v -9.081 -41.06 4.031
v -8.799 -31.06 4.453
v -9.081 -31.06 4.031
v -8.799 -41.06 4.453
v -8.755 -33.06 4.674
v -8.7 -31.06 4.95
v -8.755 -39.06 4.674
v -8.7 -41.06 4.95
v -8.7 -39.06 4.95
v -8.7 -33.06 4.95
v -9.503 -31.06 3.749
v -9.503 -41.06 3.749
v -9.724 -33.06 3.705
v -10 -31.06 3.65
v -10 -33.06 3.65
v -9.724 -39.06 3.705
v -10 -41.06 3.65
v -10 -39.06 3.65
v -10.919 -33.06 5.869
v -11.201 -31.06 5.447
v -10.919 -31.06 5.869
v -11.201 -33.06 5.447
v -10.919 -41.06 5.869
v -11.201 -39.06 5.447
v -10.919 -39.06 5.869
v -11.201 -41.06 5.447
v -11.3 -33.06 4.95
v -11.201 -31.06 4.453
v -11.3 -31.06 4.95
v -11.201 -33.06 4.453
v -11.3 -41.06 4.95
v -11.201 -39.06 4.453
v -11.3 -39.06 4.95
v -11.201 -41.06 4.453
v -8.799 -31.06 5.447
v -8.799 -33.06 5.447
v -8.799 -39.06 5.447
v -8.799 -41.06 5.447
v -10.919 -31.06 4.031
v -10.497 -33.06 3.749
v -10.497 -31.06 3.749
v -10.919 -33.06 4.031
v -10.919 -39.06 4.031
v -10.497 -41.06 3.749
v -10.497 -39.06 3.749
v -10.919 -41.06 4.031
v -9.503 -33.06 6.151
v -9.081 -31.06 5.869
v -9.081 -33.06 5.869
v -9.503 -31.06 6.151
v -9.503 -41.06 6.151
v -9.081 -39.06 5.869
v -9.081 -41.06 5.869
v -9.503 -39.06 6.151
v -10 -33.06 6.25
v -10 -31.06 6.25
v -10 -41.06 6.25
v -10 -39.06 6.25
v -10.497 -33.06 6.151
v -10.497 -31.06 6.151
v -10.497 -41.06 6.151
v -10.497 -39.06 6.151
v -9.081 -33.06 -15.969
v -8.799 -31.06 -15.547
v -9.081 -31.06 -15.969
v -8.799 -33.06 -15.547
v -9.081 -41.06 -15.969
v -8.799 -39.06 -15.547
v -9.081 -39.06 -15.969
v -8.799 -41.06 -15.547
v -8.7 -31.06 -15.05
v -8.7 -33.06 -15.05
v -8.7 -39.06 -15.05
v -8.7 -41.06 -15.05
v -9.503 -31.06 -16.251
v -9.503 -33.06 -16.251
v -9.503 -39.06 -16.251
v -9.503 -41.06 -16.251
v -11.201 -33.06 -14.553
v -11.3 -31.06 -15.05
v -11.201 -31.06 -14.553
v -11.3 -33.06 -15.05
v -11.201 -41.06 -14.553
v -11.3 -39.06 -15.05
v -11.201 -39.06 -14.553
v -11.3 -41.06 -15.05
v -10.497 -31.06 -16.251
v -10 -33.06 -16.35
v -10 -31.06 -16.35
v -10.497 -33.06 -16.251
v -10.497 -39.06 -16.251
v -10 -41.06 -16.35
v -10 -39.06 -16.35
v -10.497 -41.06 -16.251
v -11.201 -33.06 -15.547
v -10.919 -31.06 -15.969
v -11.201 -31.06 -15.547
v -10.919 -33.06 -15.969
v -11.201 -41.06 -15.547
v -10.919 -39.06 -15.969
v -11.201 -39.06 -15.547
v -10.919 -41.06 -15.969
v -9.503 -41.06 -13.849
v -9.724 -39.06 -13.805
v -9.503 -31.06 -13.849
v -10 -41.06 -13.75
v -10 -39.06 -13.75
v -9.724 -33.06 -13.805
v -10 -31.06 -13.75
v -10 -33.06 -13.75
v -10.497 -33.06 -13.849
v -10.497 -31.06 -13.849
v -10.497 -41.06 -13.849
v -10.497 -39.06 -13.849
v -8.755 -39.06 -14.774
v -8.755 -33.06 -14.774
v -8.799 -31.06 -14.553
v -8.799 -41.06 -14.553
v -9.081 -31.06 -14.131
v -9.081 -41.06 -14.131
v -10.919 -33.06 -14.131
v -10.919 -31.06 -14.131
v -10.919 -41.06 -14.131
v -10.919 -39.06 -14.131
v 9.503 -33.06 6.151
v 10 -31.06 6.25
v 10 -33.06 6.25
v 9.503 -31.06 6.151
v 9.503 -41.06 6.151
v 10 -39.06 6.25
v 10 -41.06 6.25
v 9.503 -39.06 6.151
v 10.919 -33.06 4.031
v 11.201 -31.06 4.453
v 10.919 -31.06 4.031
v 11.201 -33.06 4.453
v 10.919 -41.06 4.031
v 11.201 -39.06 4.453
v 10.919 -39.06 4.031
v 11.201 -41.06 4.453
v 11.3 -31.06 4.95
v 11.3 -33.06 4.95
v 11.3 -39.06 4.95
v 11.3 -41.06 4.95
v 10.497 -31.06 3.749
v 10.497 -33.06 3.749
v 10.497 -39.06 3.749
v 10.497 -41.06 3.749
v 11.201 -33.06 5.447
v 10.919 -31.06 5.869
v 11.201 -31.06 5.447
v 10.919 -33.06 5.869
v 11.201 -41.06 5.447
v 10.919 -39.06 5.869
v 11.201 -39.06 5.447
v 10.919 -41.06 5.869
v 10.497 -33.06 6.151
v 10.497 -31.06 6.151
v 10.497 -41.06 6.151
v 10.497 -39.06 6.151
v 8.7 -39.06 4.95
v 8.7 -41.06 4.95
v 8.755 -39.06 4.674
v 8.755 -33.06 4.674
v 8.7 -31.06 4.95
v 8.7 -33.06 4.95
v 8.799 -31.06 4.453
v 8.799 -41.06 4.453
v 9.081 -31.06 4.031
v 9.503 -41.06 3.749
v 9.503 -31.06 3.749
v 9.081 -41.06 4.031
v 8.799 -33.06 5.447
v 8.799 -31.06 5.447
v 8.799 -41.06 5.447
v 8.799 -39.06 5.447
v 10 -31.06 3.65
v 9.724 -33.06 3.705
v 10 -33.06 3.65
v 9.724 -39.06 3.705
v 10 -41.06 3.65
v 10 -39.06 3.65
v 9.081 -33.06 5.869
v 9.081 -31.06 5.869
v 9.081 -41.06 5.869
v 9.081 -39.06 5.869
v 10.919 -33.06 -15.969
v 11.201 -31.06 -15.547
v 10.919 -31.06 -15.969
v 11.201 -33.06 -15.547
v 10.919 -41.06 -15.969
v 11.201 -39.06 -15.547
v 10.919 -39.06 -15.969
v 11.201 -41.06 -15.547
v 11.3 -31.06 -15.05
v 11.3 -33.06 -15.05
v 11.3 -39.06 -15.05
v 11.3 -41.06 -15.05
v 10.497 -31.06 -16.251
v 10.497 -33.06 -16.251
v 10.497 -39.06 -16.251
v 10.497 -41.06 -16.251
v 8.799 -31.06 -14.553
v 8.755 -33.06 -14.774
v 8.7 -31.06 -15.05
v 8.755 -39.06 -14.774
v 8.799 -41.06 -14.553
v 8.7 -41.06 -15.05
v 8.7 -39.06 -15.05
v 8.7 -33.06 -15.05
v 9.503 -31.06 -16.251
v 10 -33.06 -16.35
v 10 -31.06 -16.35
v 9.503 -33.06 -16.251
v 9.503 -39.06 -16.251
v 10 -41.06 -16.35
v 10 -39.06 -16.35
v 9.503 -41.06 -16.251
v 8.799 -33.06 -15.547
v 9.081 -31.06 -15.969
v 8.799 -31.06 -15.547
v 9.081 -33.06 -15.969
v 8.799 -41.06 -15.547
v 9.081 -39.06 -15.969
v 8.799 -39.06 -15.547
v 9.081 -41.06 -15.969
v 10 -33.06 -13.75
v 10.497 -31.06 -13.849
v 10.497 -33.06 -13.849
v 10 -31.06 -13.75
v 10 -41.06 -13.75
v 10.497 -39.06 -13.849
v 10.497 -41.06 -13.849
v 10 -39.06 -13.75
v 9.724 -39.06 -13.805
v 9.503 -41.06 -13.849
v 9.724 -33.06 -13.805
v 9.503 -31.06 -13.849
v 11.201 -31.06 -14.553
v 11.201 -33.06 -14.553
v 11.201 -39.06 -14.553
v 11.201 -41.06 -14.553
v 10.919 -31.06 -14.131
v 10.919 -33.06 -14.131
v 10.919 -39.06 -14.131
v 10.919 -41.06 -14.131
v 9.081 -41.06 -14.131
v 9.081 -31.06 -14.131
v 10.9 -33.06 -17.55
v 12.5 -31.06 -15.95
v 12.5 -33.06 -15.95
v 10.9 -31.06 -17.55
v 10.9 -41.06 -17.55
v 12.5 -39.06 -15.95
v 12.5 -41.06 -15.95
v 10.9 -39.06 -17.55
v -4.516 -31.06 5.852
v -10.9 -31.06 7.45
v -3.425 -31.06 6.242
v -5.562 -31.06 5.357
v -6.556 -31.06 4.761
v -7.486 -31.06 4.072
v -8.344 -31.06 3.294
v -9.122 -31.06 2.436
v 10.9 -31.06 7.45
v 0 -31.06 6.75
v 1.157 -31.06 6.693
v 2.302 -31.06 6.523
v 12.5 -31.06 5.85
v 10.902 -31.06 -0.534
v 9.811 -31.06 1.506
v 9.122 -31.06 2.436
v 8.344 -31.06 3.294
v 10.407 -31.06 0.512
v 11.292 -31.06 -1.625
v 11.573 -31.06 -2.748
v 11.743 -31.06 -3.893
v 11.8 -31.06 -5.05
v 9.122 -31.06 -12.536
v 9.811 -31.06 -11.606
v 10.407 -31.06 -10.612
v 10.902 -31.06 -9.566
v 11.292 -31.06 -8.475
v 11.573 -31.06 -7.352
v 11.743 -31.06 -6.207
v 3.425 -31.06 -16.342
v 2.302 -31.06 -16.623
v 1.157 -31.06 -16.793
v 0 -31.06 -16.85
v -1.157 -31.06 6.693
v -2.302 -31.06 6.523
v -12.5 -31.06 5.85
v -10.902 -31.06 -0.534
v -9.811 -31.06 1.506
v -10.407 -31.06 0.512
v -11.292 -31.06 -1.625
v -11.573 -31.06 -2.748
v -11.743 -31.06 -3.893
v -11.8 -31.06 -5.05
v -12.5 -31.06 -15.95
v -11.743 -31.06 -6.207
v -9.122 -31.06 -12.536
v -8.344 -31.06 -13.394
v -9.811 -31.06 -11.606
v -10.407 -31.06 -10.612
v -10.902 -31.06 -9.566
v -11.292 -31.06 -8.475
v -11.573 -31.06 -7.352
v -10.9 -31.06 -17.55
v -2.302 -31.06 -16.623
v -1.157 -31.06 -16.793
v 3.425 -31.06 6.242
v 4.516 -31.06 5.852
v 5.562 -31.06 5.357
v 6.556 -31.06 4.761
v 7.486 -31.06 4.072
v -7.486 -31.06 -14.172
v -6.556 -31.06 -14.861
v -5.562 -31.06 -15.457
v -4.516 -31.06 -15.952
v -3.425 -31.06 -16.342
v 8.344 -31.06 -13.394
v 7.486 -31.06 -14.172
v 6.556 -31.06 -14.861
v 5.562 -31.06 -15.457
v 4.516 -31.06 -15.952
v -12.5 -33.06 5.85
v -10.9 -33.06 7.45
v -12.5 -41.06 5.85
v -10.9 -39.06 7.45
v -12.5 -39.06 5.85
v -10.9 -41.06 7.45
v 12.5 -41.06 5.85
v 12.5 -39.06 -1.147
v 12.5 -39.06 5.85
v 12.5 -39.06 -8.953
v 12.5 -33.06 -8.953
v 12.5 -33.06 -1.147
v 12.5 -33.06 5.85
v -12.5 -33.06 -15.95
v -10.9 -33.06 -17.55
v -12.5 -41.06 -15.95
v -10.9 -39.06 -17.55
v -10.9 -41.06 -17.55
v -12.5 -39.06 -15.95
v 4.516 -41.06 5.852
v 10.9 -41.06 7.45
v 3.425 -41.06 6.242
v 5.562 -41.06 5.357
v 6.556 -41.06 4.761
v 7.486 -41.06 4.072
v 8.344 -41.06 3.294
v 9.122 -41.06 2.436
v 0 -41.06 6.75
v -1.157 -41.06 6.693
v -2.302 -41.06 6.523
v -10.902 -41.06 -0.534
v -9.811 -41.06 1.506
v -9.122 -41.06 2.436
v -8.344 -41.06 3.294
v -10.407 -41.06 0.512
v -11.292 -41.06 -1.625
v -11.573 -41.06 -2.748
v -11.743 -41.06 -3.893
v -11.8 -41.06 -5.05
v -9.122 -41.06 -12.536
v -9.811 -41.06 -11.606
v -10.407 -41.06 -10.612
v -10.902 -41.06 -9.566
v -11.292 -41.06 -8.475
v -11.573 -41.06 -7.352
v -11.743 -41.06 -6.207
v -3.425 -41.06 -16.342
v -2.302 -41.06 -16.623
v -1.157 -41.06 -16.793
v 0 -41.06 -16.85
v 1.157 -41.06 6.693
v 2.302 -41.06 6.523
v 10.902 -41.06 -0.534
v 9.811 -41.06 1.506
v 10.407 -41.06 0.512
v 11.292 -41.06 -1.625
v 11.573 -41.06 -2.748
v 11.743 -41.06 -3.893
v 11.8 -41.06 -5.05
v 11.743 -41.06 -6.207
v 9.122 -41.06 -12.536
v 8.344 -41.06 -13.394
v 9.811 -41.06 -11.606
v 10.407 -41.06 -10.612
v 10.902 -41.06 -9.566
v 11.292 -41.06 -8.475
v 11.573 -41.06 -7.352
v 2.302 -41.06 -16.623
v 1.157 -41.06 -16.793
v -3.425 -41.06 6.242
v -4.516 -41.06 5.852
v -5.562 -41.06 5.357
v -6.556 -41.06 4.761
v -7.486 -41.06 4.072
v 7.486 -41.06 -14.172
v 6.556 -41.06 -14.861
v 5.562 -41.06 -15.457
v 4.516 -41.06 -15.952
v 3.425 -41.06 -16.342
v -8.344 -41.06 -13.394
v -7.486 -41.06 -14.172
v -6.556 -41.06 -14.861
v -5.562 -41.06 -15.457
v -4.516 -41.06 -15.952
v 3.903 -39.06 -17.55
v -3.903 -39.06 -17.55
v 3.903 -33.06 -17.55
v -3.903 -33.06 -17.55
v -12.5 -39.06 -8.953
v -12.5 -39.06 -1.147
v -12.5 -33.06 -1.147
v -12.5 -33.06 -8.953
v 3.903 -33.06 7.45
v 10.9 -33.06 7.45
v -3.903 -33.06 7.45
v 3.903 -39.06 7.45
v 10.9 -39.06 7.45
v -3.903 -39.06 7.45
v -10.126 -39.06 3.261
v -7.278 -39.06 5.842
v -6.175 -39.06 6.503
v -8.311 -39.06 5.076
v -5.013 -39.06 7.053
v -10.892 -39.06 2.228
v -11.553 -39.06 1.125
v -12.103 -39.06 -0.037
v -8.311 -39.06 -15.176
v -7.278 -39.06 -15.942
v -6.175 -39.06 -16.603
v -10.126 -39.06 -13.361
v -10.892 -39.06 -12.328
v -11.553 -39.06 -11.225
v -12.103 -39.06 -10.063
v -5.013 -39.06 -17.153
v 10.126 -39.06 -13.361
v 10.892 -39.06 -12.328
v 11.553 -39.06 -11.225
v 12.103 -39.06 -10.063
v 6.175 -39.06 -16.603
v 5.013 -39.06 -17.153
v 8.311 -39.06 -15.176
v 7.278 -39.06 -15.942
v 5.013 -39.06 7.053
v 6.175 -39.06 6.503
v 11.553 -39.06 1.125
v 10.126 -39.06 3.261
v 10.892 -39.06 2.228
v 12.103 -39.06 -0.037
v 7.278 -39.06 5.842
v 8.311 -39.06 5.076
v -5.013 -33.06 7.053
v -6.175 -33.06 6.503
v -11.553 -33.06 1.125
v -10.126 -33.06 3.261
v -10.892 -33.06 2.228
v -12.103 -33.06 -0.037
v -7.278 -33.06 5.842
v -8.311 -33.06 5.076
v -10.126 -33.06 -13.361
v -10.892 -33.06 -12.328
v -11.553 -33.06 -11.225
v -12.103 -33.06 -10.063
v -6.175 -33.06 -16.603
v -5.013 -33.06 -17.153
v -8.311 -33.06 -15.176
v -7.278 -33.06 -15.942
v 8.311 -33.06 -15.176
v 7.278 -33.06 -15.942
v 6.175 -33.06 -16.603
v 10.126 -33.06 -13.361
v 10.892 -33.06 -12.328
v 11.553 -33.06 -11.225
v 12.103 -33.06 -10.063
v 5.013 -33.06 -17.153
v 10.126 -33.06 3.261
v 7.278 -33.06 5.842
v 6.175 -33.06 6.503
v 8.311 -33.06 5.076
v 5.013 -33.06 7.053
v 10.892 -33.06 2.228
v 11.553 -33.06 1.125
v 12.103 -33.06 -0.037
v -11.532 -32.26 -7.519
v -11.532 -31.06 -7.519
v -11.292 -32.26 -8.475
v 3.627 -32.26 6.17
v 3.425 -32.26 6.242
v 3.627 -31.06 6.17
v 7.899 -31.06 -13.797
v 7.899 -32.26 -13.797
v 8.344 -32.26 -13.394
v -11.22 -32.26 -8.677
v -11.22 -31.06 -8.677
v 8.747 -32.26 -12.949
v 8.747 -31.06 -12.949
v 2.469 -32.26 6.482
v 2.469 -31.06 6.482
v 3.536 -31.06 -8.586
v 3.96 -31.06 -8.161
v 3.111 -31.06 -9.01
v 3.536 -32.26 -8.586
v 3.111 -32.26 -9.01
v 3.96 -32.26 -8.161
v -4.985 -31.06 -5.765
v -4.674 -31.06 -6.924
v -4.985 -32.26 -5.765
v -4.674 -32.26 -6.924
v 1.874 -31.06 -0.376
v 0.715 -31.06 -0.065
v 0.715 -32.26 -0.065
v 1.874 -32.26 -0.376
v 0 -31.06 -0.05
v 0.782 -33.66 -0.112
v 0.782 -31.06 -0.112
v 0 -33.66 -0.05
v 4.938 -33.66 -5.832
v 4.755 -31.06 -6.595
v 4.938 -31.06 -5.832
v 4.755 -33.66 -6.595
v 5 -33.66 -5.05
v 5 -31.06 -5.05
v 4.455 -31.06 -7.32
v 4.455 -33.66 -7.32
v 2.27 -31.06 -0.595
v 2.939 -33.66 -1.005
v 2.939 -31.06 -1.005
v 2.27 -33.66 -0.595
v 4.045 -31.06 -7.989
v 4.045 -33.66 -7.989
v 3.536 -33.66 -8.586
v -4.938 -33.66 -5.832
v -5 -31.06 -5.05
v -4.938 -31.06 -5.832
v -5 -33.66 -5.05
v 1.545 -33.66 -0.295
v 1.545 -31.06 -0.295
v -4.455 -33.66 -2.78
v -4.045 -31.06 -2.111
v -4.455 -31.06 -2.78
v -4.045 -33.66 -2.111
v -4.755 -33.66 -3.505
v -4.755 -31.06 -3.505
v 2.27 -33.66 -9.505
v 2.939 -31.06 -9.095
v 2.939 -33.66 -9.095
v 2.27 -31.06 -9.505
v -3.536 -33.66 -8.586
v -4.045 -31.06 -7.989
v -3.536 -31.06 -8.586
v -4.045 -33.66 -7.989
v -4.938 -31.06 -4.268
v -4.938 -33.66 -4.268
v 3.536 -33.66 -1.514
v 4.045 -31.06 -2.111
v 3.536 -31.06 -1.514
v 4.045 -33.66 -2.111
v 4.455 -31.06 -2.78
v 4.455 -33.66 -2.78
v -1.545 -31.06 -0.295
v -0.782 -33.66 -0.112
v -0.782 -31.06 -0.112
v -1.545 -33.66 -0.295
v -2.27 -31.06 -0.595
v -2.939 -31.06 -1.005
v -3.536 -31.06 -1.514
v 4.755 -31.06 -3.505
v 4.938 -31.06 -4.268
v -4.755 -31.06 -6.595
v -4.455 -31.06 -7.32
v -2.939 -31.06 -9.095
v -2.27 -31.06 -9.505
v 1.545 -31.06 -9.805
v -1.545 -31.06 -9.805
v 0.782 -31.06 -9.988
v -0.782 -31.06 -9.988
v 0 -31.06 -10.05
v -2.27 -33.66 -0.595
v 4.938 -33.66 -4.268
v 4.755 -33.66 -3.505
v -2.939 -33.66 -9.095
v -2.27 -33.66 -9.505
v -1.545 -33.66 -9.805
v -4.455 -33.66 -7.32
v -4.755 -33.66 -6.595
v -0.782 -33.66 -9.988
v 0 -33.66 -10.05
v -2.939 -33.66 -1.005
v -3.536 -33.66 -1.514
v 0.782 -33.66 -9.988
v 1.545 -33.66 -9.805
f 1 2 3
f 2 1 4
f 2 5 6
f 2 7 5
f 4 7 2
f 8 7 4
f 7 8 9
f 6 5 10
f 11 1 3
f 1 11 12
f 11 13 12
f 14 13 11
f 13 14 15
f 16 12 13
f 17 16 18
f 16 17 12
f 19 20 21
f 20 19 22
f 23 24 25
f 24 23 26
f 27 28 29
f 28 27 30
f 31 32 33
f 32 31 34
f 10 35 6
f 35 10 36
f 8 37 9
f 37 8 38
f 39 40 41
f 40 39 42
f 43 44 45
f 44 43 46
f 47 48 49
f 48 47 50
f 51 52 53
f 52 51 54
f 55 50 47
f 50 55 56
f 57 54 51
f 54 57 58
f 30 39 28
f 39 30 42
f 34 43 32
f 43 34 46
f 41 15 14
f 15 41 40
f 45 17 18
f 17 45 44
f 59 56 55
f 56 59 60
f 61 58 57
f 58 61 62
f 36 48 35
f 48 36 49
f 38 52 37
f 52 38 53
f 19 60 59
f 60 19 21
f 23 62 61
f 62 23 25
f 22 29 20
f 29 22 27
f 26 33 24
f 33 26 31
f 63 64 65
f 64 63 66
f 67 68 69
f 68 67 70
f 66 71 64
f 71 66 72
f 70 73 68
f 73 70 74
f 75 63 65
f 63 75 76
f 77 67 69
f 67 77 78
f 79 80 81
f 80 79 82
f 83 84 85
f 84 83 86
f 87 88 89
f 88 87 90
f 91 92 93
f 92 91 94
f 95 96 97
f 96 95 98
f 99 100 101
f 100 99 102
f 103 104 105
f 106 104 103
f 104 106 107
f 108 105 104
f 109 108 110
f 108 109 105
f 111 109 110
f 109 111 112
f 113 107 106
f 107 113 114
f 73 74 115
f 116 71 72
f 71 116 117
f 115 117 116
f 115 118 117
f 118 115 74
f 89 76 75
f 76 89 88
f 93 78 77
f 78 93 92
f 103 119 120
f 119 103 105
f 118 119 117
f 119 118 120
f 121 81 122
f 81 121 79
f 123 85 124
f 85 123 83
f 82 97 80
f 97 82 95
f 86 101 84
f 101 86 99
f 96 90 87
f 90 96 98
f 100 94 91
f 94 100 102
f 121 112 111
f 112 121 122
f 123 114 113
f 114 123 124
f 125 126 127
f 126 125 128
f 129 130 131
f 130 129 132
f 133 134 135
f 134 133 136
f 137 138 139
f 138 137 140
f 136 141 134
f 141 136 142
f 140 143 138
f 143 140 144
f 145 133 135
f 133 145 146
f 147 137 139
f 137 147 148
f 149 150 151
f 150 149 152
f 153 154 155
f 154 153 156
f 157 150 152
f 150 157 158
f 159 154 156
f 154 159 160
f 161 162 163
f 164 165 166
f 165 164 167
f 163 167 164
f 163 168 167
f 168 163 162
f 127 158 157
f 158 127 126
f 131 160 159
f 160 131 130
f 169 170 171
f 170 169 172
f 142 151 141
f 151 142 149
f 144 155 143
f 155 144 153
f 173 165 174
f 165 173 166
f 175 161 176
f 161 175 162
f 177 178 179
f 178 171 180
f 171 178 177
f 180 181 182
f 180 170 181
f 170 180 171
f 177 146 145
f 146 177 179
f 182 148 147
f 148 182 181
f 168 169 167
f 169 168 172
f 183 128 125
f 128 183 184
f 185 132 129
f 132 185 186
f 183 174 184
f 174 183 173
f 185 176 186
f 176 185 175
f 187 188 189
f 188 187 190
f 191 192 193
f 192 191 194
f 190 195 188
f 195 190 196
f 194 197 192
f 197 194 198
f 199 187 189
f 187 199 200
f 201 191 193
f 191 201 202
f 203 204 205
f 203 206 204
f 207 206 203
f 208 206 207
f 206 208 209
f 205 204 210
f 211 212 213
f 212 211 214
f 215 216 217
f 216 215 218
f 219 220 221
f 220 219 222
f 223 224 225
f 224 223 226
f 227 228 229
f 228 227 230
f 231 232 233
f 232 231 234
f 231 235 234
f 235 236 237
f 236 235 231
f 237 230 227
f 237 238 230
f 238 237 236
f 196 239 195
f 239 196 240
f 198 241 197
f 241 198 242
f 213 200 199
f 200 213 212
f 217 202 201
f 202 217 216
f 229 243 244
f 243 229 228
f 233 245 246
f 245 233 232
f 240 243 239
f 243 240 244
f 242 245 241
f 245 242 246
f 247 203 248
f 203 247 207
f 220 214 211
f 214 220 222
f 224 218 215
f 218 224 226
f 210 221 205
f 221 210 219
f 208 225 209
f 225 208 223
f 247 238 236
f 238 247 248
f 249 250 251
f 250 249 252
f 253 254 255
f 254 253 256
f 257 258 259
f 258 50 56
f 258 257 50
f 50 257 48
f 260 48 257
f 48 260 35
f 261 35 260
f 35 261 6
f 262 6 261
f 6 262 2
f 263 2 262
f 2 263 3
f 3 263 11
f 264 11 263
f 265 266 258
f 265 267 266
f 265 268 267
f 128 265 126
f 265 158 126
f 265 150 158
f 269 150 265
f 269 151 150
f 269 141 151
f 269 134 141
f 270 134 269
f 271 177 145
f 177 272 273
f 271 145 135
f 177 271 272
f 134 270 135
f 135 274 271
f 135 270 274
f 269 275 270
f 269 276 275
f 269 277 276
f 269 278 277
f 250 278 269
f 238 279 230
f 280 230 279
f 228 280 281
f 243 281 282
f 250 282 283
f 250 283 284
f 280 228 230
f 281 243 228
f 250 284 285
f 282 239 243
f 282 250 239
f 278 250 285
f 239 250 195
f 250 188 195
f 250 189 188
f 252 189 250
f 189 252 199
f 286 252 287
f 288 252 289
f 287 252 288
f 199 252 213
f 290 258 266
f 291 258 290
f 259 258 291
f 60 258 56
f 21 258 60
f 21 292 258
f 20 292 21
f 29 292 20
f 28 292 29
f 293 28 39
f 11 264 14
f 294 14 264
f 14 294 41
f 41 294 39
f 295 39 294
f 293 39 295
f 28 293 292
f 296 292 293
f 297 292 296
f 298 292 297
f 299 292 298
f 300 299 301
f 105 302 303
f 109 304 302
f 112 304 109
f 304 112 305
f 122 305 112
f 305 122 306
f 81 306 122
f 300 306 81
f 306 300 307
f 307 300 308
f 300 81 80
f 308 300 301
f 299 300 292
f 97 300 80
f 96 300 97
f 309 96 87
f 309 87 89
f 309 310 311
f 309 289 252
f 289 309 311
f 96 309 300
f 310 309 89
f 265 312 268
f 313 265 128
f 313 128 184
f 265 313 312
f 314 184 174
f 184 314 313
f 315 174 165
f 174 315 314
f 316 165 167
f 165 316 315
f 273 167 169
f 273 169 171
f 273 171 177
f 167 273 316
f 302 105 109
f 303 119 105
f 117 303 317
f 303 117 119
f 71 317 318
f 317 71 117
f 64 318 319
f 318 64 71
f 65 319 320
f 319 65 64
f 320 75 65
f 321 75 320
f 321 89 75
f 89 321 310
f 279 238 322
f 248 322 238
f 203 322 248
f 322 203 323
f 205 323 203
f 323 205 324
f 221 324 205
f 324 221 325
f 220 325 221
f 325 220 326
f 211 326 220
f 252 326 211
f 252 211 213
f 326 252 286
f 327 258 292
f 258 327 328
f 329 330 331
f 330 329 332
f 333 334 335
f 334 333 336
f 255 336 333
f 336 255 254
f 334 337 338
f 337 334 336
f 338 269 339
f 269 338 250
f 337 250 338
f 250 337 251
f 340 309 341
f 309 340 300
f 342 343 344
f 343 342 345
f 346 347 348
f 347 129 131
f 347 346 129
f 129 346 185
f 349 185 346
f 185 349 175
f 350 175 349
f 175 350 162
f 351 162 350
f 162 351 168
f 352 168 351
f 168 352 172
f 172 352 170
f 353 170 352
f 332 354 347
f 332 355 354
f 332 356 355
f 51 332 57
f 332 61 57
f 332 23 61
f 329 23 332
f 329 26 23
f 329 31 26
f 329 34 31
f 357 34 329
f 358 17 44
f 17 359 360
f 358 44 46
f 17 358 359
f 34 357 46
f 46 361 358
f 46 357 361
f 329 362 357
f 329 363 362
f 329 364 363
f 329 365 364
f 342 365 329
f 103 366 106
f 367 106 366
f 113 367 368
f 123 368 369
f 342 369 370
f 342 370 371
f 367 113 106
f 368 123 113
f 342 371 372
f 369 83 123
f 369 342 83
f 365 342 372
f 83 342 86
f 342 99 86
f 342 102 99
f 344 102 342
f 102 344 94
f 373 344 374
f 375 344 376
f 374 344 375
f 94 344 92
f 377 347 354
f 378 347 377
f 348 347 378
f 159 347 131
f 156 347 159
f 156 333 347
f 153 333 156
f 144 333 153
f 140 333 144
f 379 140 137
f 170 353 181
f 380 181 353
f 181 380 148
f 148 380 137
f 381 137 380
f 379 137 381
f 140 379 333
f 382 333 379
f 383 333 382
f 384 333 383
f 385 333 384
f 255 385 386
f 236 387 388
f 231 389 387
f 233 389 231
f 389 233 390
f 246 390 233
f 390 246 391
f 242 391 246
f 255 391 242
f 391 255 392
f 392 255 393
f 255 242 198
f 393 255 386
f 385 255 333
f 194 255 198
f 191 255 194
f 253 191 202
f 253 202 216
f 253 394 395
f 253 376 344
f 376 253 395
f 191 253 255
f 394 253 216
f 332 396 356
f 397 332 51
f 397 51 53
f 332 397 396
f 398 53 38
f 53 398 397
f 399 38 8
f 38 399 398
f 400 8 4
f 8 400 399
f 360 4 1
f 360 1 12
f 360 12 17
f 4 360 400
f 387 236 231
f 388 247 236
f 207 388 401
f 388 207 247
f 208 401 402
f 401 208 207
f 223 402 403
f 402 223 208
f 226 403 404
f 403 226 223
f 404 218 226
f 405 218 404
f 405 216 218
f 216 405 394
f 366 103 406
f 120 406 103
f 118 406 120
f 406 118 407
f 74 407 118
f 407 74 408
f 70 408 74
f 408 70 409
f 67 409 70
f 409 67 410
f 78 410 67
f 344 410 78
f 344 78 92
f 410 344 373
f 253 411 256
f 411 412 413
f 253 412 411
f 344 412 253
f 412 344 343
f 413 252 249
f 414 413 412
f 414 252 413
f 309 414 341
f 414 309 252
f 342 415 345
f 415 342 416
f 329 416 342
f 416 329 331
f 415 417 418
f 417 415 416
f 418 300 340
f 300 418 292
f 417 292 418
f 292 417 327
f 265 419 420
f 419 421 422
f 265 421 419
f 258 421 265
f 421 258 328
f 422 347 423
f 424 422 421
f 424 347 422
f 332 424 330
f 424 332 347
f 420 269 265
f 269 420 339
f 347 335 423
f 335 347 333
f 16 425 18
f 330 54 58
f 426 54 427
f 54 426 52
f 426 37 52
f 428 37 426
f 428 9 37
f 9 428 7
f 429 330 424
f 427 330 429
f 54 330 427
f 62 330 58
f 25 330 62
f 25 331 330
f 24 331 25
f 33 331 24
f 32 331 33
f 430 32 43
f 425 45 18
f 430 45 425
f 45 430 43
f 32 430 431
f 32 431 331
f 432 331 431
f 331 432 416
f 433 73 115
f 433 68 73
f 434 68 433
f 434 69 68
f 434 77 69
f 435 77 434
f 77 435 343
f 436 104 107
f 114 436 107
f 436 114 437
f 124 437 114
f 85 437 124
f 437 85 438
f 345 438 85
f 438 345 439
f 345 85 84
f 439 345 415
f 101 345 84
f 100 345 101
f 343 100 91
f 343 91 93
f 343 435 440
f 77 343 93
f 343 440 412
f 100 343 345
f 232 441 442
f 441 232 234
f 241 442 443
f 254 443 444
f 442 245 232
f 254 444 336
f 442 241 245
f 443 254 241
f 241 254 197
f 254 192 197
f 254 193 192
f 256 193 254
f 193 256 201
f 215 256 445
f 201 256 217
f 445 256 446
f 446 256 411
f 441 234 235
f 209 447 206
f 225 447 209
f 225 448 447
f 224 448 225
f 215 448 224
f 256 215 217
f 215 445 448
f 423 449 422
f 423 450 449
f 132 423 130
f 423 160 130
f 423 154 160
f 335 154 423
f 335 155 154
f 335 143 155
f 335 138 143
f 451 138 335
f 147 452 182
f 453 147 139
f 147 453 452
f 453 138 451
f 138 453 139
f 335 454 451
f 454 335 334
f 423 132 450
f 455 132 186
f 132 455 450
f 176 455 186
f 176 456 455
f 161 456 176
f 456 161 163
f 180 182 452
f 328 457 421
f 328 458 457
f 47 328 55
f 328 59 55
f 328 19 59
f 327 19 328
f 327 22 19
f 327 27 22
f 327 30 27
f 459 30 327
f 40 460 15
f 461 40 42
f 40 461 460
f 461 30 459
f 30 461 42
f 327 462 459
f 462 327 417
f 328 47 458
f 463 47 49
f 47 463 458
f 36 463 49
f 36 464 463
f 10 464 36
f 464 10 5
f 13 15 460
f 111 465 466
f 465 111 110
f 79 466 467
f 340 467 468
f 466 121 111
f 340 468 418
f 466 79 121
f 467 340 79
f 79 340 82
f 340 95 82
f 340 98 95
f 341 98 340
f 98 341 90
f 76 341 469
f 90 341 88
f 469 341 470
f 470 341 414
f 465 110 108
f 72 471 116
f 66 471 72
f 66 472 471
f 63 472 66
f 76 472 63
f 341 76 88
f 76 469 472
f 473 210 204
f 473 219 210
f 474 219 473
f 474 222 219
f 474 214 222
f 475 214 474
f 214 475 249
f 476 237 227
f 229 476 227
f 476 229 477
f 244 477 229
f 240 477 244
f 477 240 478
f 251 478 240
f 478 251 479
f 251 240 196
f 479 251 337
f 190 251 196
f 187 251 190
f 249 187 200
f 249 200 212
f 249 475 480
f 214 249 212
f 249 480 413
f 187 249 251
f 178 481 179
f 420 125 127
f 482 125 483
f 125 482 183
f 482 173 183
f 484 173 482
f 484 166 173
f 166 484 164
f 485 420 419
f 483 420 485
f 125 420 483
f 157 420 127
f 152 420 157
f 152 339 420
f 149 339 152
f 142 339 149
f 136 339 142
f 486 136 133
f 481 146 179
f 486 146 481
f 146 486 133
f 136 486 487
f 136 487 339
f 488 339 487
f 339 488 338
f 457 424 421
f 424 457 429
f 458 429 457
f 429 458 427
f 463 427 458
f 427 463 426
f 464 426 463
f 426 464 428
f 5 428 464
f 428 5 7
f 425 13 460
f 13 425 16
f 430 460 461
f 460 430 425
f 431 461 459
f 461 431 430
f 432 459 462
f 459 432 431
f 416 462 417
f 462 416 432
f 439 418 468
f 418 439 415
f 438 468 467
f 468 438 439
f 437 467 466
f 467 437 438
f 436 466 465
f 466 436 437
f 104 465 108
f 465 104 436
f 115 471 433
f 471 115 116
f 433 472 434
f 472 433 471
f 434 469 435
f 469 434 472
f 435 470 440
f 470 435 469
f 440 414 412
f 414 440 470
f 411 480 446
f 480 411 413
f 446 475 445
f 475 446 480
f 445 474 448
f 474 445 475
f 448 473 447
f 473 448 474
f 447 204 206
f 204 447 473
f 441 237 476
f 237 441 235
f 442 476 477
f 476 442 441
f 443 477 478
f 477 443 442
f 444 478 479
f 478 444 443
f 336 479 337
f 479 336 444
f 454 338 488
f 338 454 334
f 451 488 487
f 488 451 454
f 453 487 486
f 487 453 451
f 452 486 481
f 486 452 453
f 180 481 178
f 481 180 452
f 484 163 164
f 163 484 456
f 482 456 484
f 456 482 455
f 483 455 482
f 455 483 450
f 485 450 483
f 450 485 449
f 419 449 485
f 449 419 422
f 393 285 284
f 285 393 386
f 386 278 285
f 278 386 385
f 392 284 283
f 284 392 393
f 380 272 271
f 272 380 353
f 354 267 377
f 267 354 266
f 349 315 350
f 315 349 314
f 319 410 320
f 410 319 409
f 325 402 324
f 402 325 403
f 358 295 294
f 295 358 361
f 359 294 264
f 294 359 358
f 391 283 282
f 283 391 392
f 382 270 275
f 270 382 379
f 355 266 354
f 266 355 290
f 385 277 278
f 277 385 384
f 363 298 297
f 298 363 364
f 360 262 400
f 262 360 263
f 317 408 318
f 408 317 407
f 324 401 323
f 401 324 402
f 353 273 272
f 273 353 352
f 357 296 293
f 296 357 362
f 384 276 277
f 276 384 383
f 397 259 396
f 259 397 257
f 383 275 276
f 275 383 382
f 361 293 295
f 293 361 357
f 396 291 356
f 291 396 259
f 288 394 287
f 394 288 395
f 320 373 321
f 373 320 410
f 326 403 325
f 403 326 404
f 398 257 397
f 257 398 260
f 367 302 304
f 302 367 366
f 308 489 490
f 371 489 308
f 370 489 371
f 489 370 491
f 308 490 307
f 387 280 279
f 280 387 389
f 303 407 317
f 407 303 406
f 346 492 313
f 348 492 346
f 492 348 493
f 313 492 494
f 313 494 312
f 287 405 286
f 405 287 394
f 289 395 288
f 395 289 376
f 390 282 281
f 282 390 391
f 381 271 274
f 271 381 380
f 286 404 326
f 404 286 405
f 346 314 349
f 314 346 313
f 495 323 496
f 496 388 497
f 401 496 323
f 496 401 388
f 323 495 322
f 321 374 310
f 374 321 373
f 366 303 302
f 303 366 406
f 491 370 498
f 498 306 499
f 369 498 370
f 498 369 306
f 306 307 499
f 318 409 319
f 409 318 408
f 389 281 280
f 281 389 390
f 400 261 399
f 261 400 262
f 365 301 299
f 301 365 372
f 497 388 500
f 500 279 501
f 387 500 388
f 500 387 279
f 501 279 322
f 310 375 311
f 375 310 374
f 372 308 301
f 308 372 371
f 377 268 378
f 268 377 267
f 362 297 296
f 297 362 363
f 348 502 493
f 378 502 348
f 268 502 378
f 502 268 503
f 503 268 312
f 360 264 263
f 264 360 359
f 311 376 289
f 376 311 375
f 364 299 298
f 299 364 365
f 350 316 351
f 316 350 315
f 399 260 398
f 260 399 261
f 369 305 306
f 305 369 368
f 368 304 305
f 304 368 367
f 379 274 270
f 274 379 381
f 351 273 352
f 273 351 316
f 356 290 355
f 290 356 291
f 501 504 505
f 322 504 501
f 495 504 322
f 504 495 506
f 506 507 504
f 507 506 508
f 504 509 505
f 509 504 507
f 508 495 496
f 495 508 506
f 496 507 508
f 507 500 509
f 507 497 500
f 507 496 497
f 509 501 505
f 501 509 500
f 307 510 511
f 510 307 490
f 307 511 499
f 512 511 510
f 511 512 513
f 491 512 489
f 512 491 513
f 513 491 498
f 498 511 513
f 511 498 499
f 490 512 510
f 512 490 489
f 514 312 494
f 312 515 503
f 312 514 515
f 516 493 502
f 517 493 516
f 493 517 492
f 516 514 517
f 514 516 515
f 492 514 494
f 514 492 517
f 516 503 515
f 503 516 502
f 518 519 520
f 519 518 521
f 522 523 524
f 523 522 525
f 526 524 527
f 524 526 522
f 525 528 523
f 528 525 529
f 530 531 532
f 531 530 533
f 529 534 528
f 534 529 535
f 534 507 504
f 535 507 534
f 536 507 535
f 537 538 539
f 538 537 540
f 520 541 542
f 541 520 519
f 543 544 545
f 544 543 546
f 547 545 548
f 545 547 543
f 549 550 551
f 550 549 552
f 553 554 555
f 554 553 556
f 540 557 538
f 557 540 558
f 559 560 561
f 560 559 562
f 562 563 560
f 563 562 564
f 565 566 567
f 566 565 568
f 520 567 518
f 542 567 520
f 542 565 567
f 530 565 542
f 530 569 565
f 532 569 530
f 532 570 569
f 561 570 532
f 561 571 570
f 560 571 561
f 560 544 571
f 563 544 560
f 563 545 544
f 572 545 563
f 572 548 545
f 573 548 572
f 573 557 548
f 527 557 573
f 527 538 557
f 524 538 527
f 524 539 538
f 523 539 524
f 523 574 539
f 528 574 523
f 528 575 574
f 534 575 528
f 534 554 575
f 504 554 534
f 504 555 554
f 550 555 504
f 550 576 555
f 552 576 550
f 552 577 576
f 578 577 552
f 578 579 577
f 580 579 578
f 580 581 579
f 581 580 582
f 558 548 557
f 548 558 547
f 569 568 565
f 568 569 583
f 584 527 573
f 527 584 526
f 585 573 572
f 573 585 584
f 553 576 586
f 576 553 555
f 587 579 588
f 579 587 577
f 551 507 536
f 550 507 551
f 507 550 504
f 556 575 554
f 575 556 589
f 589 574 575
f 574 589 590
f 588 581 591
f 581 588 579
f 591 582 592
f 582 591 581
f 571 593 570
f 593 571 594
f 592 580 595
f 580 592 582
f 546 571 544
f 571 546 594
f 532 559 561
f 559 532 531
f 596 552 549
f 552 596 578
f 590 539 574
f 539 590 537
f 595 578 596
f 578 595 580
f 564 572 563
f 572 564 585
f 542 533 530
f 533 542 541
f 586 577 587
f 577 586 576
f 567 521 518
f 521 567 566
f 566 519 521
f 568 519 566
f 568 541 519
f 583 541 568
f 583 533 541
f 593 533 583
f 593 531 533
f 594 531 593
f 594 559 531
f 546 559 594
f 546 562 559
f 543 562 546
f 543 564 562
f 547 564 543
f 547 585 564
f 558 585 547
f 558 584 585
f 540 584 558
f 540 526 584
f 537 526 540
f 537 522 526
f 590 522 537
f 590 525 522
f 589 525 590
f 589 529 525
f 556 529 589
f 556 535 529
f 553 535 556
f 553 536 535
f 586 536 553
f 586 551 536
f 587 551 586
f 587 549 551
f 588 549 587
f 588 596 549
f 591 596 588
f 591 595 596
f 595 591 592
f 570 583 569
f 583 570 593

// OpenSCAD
// file: lib/fans.scad
// Fan models for the preview only.

// 4010 blower like the Creality Ender 3 stock part-cooling fan: square 40 x 40 body with rounded corners,
// round intake on the outer face, outlet towards -Z at the +Y end. Profile in the YZ plane.
// body_y = [y0, y1] of the body, z0 = bottom edge (rests in the cradle), c = impeller axis [y, z],
// outlet = [y0, y1] of the outlet opening, ears = [y, z] of the mounting holes.
module blower_4010(x0, t, c, body_y, z0, outlet, ears, impeller = true) {
    side = body_y[1] - body_y[0];
    module profile() offset(r = 3.5) offset(delta = -3.5) translate([body_y[0], z0]) square([side, side]);
    module on_x(h, z = 0) translate([x0 + z, 0, 0]) rotate([90, 0, 90]) linear_extrude(height = h) children();
    difference() {
        on_x(t) profile();
        // mounting holes
        for (o = ears) on_x(t + 2, -1) translate(o) circle(d = 3.4, $fn = 20);
        // impeller pocket, open on the outer face (1 mm back wall)
        on_x(t - 1.0, 1.0 + 0.01) translate(c) circle(d = 27, $fn = 64);
        // outlet
        translate([x0 + 1.2, outlet[0] + 0.3, z0 - 0.01]) cube([t - 2.4, outlet[1] - outlet[0] - 1.5, 5]);
    }
    // raised rim around the intake
    on_x(0.4, t) translate(c) difference() { circle(d = 31, $fn = 64); circle(d = 27, $fn = 64); }
    if (impeller) blower_4010_impeller(x0, t, c);
}

// Blower impeller (separate part so it can spin): axis parallel to X through (c[0], c[1]).
module blower_4010_impeller(x0, t, c) {
    module on_x(h, z = 0) translate([x0 + z, 0, 0]) rotate([90, 0, 90]) linear_extrude(height = h) children();
    // back disc, forward-curved blades (30 of them), hub and its label
    on_x(0.6, 1.05) translate(c) circle(d = 26, $fn = 64);
    on_x(t - 3.2, 1.6) translate(c) for (i = [0 : 29]) rotate(i * 12)
        translate([7.2, 0]) rotate(28) square([5.6, 0.7]);
    on_x(t - 2.4, 1.6) translate(c) circle(d = 11.5, $fn = 32);
    on_x(0.3, t - 0.8) translate(c) circle(d = 10.6, $fn = 32);
}

// 2510 axial fan: axis along +Z, intake face at z = 0, centred in XY.
module axial_2510(side = 25, height = 10, blades = true) {
    r_corner = 1.6;
    module rounded_square(l) offset(r = r_corner) square(l - 2 * r_corner, center = true);
    difference() {
        linear_extrude(height = height) rounded_square(side);
        // corner recess between the two flanges (this is what forms the mounting ears)
        translate([0, 0, 2]) linear_extrude(height = height - 4)
            difference() { square(side + 2, center = true); circle(d = side + 1.2, $fn = 64); }
        // blade opening
        translate([0, 0, -1]) cylinder(d = 23.6, h = height + 2, $fn = 64);
        // mounting holes (20 mm apart)
        for (x = [-10, 10], y = [-10, 10]) translate([x, y, -1]) cylinder(d = 2.6, h = height + 2, $fn = 16);
    }
    if (blades) axial_2510_rotor(height);
    // motor and motor-mount spokes on the back face
    translate([0, 0, height - 2.6]) cylinder(d = 10, h = 2.6, $fn = 40);
    translate([0, 0, height - 1.2]) for (a = [45, 165, 285]) rotate(a) translate([5, -0.6, 0]) cube([7.2, 1.2, 1.2]);
}

// 2510 hub and blades (separate part so it can spin): axis = Z.
module axial_2510_rotor(height = 10) {
    translate([0, 0, 0.8]) cylinder(d = 12, h = height - 3.6, $fn = 40);
    translate([0, 0, 1.2]) for (i = [0 : 6]) rotate(i * 360 / 7)
        linear_extrude(height = height - 3.6, twist = -32, slices = 6) translate([5.5, -0.5]) square([6.0, 1.0]);
}

// Flat variant: the same 4010 blower sitting on its bottom edge with the intake facing the front (-Y),
// like the 2510 hotend fan. x0 = inner side, y0 = front face (intake), z0 = bottom edge.
// Profile in the XZ plane, measured from (x0, z0): c = impeller axis, outlet = [from, to] along the bottom edge
// (at the inner end), ears = mounting holes. The outlet points down (-Z) into the adapter.
module blower_4010_front(x0, y0, z0, t = 10, side = 40, c = [21.2, 19.0], outlet = [1.2, 16.2],
                   ears = [[3.6, side - 3.6], [side - 3.6, 3.6]], impeller = true) {
    module profile() {
        offset(r = 3.5) offset(delta = -3.5) square([side, side]);
        square([outlet[1] + 1.2, 6]);                  // square corner where the outlet spout is
    }
    // w = 0 at the back face (y0 + t), w = t at the front face (y0)
    module on_y(h, w = 0) translate([x0, y0 + t, z0]) rotate([90, 0, 0]) translate([0, 0, w]) linear_extrude(height = h) children();
    difference() {
        on_y(t) profile();
        for (o = ears) on_y(t + 2, -1) translate(o) circle(d = 3.4, $fn = 20);   // mounting holes
        on_y(t - 1.0, 1.0 + 0.01) translate(c) circle(d = 27, $fn = 64);          // impeller pocket, open at the front
        translate([x0 + outlet[0], y0 + 1.2, z0 - 0.01]) cube([outlet[1] - outlet[0], t - 2.4, 5]);   // outlet
    }
    on_y(0.4, t) translate(c) difference() { circle(d = 31, $fn = 64); circle(d = 27, $fn = 64); }   // rim round the intake
    if (impeller) blower_4010_front_impeller(x0, y0, z0, t, c);
}

// Blower impeller (separate part so it can spin): axis parallel to Y through (x0 + c[0], z0 + c[1]).
module blower_4010_front_impeller(x0, y0, z0, t = 10, c = [21.2, 19.0]) {
    module on_y(h, w = 0) translate([x0, y0 + t, z0]) rotate([90, 0, 0]) translate([0, 0, w]) linear_extrude(height = h) children();
    // back disc, forward-curved blades (30 of them), hub and its label
    on_y(0.6, 1.05) translate(c) circle(d = 26, $fn = 64);
    on_y(t - 3.2, 1.6) translate(c) for (i = [0 : 29]) rotate(i * 12) translate([7.2, 0]) rotate(28) square([5.6, 0.7]);
    on_y(t - 2.4, 1.6) translate(c) circle(d = 11.5, $fn = 32);
    on_y(0.3, t - 0.8) translate(c) circle(d = 10.6, $fn = 32);
}
// main file
// color: #0e0e0f
// PREVIEW ONLY: 2510 hotend fan (the Anycubic Kobra X one), blowing towards +Y onto the V6.
// Screwed to the 25 -> 30 mm adapter (fan_adapter_2510_30.scad); the rotor is in view_fan_2510_rotor.scad.
include <lib/fans.scad>

face  = -27.06;   // outer face of the clamp plate
cz    = -5.05;    // centre of the 30 mm hole pattern
ad_t  = 4.0;      // 25 -> 30 adapter thickness

translate([0, face - ad_t - 10, cz]) rotate([-90, 0, 0]) axial_2510(blades = false);
